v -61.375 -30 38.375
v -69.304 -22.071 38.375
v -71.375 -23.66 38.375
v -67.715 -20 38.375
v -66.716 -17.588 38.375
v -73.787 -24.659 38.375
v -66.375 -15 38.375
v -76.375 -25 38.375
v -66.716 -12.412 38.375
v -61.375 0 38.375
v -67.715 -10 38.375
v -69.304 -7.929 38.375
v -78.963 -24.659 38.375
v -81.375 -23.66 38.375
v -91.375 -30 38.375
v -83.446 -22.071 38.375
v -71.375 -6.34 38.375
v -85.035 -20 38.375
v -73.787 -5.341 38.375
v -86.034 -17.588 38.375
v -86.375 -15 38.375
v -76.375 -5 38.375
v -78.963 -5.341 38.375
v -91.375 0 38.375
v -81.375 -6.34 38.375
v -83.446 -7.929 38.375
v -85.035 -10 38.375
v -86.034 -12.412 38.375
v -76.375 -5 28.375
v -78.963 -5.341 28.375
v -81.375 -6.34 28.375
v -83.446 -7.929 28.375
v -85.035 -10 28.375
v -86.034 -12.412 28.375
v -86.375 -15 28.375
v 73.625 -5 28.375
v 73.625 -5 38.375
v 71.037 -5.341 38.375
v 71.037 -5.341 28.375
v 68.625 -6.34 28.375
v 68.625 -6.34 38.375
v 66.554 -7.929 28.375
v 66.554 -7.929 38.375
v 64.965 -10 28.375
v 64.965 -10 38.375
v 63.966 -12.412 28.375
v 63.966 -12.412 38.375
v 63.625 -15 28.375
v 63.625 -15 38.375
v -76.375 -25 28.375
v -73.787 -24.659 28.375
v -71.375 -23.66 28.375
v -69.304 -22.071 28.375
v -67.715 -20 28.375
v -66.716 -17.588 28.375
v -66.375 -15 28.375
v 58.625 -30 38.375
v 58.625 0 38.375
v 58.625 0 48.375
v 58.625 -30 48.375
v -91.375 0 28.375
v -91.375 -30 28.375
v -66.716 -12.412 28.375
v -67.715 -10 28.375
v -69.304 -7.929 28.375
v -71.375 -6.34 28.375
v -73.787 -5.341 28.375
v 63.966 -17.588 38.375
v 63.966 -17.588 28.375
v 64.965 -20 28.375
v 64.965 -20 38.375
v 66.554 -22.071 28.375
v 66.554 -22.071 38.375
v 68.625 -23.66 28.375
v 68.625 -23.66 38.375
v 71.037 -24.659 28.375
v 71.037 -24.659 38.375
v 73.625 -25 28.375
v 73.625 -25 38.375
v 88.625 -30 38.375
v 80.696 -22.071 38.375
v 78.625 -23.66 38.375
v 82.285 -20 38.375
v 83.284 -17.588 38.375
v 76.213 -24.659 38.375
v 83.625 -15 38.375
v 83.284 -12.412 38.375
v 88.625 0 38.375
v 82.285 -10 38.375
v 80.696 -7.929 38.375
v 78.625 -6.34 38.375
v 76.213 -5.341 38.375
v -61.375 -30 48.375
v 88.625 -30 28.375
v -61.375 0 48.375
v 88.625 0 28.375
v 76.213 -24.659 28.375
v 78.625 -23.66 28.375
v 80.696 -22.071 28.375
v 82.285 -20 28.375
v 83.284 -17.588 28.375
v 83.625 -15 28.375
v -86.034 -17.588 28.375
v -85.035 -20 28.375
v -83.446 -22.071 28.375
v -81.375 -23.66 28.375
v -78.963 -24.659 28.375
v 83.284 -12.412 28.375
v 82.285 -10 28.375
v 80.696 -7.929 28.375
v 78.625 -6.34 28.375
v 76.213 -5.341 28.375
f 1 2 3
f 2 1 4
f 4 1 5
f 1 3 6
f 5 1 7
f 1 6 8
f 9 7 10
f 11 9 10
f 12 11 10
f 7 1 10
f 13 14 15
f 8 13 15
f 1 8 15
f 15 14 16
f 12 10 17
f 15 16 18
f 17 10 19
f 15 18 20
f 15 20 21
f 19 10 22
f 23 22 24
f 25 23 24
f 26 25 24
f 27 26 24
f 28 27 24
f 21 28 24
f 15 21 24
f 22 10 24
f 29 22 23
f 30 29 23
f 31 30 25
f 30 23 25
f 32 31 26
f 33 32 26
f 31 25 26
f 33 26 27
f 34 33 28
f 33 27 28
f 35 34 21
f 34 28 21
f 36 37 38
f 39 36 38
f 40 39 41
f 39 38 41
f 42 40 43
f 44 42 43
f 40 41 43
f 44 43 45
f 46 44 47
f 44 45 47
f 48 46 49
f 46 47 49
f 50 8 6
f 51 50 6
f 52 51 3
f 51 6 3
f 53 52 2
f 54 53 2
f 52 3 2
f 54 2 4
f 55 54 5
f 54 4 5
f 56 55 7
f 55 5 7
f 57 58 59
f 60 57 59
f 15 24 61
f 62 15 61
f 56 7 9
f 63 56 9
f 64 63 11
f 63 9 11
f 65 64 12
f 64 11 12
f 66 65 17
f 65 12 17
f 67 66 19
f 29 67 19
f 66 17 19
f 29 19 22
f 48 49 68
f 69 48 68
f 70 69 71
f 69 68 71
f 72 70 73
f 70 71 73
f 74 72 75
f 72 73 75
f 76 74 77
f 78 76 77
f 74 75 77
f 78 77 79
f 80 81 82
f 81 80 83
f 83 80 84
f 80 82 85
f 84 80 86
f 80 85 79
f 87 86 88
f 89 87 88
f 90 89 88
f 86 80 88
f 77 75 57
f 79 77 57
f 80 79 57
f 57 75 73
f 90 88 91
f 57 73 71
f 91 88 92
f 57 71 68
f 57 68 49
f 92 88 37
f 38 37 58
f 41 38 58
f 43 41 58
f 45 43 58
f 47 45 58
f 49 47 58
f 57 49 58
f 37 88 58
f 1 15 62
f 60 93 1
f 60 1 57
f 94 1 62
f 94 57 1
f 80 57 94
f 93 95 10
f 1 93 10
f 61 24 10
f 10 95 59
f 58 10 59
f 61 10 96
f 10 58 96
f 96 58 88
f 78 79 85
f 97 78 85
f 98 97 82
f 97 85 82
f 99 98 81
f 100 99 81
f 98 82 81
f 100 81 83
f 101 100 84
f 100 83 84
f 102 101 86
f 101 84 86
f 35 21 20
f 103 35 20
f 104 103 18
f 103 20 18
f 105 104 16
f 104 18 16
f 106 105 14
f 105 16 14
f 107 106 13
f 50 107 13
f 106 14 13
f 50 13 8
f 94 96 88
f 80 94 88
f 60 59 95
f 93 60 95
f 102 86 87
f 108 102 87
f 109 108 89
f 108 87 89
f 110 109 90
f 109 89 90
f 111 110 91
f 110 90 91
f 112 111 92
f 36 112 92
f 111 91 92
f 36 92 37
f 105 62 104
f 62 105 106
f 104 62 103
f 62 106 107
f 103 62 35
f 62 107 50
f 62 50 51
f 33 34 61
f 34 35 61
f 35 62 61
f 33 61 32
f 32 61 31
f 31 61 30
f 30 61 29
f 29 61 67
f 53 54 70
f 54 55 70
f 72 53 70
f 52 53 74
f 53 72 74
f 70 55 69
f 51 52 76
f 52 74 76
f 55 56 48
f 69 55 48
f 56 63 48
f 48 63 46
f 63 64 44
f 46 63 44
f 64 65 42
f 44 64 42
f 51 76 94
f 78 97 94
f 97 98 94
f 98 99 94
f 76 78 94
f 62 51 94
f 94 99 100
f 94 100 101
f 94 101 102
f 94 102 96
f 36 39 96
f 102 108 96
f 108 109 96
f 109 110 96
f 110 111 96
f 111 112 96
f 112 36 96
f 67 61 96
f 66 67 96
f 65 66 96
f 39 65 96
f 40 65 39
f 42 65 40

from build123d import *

# Parameters (mm, degrees)
F1_DEPTH = 30
F4_DEPTH = 25
F5_DEPTH = 25


with BuildPart() as f1:
    # F0 (on Front) → F1 (new body)
    with BuildSketch(Plane.XZ):
        Polygon((-91.375001, 38.374996), (-91.375001, 28.374996), (88.624999, 28.374996), (88.624999, 38.374996), (58.624999, 38.374996), (58.624999, 48.374996), (-61.375001, 48.374996), (-61.375001, 38.374996), align=None)
    extrude(amount=F1_DEPTH)

    # F2 (on face) → F4 (cut)
    with BuildSketch(Plane.XY.offset(38.374996)):
        with BuildLine():
            ThreePointArc((73.624999, -25), (80.696067, -22.071068), (83.624999, -15))
            ThreePointArc((83.624999, -15), (80.696067, -7.928932), (73.624999, -5))
            ThreePointArc((73.624999, -5), (66.553931, -7.928932), (63.624999, -15))
            ThreePointArc((63.624999, -15), (66.553931, -22.071068), (73.624999, -25))
        make_face()
    extrude(amount=-F4_DEPTH, mode=Mode.SUBTRACT)

    # F3 (on face) → F5 (cut)
    with BuildSketch(Plane.XY.offset(38.374996)):
        with BuildLine():
            ThreePointArc((-76.375001, -25), (-69.303933, -22.071068), (-66.375001, -15))
            ThreePointArc((-66.375001, -15), (-69.303933, -7.928932), (-76.375001, -5))
            ThreePointArc((-76.375001, -5), (-83.446069, -7.928932), (-86.375001, -15))
            ThreePointArc((-86.375001, -15), (-83.446069, -22.071068), (-76.375001, -25))
        make_face()
    extrude(amount=-F5_DEPTH, mode=Mode.SUBTRACT)


solid = f1.part
